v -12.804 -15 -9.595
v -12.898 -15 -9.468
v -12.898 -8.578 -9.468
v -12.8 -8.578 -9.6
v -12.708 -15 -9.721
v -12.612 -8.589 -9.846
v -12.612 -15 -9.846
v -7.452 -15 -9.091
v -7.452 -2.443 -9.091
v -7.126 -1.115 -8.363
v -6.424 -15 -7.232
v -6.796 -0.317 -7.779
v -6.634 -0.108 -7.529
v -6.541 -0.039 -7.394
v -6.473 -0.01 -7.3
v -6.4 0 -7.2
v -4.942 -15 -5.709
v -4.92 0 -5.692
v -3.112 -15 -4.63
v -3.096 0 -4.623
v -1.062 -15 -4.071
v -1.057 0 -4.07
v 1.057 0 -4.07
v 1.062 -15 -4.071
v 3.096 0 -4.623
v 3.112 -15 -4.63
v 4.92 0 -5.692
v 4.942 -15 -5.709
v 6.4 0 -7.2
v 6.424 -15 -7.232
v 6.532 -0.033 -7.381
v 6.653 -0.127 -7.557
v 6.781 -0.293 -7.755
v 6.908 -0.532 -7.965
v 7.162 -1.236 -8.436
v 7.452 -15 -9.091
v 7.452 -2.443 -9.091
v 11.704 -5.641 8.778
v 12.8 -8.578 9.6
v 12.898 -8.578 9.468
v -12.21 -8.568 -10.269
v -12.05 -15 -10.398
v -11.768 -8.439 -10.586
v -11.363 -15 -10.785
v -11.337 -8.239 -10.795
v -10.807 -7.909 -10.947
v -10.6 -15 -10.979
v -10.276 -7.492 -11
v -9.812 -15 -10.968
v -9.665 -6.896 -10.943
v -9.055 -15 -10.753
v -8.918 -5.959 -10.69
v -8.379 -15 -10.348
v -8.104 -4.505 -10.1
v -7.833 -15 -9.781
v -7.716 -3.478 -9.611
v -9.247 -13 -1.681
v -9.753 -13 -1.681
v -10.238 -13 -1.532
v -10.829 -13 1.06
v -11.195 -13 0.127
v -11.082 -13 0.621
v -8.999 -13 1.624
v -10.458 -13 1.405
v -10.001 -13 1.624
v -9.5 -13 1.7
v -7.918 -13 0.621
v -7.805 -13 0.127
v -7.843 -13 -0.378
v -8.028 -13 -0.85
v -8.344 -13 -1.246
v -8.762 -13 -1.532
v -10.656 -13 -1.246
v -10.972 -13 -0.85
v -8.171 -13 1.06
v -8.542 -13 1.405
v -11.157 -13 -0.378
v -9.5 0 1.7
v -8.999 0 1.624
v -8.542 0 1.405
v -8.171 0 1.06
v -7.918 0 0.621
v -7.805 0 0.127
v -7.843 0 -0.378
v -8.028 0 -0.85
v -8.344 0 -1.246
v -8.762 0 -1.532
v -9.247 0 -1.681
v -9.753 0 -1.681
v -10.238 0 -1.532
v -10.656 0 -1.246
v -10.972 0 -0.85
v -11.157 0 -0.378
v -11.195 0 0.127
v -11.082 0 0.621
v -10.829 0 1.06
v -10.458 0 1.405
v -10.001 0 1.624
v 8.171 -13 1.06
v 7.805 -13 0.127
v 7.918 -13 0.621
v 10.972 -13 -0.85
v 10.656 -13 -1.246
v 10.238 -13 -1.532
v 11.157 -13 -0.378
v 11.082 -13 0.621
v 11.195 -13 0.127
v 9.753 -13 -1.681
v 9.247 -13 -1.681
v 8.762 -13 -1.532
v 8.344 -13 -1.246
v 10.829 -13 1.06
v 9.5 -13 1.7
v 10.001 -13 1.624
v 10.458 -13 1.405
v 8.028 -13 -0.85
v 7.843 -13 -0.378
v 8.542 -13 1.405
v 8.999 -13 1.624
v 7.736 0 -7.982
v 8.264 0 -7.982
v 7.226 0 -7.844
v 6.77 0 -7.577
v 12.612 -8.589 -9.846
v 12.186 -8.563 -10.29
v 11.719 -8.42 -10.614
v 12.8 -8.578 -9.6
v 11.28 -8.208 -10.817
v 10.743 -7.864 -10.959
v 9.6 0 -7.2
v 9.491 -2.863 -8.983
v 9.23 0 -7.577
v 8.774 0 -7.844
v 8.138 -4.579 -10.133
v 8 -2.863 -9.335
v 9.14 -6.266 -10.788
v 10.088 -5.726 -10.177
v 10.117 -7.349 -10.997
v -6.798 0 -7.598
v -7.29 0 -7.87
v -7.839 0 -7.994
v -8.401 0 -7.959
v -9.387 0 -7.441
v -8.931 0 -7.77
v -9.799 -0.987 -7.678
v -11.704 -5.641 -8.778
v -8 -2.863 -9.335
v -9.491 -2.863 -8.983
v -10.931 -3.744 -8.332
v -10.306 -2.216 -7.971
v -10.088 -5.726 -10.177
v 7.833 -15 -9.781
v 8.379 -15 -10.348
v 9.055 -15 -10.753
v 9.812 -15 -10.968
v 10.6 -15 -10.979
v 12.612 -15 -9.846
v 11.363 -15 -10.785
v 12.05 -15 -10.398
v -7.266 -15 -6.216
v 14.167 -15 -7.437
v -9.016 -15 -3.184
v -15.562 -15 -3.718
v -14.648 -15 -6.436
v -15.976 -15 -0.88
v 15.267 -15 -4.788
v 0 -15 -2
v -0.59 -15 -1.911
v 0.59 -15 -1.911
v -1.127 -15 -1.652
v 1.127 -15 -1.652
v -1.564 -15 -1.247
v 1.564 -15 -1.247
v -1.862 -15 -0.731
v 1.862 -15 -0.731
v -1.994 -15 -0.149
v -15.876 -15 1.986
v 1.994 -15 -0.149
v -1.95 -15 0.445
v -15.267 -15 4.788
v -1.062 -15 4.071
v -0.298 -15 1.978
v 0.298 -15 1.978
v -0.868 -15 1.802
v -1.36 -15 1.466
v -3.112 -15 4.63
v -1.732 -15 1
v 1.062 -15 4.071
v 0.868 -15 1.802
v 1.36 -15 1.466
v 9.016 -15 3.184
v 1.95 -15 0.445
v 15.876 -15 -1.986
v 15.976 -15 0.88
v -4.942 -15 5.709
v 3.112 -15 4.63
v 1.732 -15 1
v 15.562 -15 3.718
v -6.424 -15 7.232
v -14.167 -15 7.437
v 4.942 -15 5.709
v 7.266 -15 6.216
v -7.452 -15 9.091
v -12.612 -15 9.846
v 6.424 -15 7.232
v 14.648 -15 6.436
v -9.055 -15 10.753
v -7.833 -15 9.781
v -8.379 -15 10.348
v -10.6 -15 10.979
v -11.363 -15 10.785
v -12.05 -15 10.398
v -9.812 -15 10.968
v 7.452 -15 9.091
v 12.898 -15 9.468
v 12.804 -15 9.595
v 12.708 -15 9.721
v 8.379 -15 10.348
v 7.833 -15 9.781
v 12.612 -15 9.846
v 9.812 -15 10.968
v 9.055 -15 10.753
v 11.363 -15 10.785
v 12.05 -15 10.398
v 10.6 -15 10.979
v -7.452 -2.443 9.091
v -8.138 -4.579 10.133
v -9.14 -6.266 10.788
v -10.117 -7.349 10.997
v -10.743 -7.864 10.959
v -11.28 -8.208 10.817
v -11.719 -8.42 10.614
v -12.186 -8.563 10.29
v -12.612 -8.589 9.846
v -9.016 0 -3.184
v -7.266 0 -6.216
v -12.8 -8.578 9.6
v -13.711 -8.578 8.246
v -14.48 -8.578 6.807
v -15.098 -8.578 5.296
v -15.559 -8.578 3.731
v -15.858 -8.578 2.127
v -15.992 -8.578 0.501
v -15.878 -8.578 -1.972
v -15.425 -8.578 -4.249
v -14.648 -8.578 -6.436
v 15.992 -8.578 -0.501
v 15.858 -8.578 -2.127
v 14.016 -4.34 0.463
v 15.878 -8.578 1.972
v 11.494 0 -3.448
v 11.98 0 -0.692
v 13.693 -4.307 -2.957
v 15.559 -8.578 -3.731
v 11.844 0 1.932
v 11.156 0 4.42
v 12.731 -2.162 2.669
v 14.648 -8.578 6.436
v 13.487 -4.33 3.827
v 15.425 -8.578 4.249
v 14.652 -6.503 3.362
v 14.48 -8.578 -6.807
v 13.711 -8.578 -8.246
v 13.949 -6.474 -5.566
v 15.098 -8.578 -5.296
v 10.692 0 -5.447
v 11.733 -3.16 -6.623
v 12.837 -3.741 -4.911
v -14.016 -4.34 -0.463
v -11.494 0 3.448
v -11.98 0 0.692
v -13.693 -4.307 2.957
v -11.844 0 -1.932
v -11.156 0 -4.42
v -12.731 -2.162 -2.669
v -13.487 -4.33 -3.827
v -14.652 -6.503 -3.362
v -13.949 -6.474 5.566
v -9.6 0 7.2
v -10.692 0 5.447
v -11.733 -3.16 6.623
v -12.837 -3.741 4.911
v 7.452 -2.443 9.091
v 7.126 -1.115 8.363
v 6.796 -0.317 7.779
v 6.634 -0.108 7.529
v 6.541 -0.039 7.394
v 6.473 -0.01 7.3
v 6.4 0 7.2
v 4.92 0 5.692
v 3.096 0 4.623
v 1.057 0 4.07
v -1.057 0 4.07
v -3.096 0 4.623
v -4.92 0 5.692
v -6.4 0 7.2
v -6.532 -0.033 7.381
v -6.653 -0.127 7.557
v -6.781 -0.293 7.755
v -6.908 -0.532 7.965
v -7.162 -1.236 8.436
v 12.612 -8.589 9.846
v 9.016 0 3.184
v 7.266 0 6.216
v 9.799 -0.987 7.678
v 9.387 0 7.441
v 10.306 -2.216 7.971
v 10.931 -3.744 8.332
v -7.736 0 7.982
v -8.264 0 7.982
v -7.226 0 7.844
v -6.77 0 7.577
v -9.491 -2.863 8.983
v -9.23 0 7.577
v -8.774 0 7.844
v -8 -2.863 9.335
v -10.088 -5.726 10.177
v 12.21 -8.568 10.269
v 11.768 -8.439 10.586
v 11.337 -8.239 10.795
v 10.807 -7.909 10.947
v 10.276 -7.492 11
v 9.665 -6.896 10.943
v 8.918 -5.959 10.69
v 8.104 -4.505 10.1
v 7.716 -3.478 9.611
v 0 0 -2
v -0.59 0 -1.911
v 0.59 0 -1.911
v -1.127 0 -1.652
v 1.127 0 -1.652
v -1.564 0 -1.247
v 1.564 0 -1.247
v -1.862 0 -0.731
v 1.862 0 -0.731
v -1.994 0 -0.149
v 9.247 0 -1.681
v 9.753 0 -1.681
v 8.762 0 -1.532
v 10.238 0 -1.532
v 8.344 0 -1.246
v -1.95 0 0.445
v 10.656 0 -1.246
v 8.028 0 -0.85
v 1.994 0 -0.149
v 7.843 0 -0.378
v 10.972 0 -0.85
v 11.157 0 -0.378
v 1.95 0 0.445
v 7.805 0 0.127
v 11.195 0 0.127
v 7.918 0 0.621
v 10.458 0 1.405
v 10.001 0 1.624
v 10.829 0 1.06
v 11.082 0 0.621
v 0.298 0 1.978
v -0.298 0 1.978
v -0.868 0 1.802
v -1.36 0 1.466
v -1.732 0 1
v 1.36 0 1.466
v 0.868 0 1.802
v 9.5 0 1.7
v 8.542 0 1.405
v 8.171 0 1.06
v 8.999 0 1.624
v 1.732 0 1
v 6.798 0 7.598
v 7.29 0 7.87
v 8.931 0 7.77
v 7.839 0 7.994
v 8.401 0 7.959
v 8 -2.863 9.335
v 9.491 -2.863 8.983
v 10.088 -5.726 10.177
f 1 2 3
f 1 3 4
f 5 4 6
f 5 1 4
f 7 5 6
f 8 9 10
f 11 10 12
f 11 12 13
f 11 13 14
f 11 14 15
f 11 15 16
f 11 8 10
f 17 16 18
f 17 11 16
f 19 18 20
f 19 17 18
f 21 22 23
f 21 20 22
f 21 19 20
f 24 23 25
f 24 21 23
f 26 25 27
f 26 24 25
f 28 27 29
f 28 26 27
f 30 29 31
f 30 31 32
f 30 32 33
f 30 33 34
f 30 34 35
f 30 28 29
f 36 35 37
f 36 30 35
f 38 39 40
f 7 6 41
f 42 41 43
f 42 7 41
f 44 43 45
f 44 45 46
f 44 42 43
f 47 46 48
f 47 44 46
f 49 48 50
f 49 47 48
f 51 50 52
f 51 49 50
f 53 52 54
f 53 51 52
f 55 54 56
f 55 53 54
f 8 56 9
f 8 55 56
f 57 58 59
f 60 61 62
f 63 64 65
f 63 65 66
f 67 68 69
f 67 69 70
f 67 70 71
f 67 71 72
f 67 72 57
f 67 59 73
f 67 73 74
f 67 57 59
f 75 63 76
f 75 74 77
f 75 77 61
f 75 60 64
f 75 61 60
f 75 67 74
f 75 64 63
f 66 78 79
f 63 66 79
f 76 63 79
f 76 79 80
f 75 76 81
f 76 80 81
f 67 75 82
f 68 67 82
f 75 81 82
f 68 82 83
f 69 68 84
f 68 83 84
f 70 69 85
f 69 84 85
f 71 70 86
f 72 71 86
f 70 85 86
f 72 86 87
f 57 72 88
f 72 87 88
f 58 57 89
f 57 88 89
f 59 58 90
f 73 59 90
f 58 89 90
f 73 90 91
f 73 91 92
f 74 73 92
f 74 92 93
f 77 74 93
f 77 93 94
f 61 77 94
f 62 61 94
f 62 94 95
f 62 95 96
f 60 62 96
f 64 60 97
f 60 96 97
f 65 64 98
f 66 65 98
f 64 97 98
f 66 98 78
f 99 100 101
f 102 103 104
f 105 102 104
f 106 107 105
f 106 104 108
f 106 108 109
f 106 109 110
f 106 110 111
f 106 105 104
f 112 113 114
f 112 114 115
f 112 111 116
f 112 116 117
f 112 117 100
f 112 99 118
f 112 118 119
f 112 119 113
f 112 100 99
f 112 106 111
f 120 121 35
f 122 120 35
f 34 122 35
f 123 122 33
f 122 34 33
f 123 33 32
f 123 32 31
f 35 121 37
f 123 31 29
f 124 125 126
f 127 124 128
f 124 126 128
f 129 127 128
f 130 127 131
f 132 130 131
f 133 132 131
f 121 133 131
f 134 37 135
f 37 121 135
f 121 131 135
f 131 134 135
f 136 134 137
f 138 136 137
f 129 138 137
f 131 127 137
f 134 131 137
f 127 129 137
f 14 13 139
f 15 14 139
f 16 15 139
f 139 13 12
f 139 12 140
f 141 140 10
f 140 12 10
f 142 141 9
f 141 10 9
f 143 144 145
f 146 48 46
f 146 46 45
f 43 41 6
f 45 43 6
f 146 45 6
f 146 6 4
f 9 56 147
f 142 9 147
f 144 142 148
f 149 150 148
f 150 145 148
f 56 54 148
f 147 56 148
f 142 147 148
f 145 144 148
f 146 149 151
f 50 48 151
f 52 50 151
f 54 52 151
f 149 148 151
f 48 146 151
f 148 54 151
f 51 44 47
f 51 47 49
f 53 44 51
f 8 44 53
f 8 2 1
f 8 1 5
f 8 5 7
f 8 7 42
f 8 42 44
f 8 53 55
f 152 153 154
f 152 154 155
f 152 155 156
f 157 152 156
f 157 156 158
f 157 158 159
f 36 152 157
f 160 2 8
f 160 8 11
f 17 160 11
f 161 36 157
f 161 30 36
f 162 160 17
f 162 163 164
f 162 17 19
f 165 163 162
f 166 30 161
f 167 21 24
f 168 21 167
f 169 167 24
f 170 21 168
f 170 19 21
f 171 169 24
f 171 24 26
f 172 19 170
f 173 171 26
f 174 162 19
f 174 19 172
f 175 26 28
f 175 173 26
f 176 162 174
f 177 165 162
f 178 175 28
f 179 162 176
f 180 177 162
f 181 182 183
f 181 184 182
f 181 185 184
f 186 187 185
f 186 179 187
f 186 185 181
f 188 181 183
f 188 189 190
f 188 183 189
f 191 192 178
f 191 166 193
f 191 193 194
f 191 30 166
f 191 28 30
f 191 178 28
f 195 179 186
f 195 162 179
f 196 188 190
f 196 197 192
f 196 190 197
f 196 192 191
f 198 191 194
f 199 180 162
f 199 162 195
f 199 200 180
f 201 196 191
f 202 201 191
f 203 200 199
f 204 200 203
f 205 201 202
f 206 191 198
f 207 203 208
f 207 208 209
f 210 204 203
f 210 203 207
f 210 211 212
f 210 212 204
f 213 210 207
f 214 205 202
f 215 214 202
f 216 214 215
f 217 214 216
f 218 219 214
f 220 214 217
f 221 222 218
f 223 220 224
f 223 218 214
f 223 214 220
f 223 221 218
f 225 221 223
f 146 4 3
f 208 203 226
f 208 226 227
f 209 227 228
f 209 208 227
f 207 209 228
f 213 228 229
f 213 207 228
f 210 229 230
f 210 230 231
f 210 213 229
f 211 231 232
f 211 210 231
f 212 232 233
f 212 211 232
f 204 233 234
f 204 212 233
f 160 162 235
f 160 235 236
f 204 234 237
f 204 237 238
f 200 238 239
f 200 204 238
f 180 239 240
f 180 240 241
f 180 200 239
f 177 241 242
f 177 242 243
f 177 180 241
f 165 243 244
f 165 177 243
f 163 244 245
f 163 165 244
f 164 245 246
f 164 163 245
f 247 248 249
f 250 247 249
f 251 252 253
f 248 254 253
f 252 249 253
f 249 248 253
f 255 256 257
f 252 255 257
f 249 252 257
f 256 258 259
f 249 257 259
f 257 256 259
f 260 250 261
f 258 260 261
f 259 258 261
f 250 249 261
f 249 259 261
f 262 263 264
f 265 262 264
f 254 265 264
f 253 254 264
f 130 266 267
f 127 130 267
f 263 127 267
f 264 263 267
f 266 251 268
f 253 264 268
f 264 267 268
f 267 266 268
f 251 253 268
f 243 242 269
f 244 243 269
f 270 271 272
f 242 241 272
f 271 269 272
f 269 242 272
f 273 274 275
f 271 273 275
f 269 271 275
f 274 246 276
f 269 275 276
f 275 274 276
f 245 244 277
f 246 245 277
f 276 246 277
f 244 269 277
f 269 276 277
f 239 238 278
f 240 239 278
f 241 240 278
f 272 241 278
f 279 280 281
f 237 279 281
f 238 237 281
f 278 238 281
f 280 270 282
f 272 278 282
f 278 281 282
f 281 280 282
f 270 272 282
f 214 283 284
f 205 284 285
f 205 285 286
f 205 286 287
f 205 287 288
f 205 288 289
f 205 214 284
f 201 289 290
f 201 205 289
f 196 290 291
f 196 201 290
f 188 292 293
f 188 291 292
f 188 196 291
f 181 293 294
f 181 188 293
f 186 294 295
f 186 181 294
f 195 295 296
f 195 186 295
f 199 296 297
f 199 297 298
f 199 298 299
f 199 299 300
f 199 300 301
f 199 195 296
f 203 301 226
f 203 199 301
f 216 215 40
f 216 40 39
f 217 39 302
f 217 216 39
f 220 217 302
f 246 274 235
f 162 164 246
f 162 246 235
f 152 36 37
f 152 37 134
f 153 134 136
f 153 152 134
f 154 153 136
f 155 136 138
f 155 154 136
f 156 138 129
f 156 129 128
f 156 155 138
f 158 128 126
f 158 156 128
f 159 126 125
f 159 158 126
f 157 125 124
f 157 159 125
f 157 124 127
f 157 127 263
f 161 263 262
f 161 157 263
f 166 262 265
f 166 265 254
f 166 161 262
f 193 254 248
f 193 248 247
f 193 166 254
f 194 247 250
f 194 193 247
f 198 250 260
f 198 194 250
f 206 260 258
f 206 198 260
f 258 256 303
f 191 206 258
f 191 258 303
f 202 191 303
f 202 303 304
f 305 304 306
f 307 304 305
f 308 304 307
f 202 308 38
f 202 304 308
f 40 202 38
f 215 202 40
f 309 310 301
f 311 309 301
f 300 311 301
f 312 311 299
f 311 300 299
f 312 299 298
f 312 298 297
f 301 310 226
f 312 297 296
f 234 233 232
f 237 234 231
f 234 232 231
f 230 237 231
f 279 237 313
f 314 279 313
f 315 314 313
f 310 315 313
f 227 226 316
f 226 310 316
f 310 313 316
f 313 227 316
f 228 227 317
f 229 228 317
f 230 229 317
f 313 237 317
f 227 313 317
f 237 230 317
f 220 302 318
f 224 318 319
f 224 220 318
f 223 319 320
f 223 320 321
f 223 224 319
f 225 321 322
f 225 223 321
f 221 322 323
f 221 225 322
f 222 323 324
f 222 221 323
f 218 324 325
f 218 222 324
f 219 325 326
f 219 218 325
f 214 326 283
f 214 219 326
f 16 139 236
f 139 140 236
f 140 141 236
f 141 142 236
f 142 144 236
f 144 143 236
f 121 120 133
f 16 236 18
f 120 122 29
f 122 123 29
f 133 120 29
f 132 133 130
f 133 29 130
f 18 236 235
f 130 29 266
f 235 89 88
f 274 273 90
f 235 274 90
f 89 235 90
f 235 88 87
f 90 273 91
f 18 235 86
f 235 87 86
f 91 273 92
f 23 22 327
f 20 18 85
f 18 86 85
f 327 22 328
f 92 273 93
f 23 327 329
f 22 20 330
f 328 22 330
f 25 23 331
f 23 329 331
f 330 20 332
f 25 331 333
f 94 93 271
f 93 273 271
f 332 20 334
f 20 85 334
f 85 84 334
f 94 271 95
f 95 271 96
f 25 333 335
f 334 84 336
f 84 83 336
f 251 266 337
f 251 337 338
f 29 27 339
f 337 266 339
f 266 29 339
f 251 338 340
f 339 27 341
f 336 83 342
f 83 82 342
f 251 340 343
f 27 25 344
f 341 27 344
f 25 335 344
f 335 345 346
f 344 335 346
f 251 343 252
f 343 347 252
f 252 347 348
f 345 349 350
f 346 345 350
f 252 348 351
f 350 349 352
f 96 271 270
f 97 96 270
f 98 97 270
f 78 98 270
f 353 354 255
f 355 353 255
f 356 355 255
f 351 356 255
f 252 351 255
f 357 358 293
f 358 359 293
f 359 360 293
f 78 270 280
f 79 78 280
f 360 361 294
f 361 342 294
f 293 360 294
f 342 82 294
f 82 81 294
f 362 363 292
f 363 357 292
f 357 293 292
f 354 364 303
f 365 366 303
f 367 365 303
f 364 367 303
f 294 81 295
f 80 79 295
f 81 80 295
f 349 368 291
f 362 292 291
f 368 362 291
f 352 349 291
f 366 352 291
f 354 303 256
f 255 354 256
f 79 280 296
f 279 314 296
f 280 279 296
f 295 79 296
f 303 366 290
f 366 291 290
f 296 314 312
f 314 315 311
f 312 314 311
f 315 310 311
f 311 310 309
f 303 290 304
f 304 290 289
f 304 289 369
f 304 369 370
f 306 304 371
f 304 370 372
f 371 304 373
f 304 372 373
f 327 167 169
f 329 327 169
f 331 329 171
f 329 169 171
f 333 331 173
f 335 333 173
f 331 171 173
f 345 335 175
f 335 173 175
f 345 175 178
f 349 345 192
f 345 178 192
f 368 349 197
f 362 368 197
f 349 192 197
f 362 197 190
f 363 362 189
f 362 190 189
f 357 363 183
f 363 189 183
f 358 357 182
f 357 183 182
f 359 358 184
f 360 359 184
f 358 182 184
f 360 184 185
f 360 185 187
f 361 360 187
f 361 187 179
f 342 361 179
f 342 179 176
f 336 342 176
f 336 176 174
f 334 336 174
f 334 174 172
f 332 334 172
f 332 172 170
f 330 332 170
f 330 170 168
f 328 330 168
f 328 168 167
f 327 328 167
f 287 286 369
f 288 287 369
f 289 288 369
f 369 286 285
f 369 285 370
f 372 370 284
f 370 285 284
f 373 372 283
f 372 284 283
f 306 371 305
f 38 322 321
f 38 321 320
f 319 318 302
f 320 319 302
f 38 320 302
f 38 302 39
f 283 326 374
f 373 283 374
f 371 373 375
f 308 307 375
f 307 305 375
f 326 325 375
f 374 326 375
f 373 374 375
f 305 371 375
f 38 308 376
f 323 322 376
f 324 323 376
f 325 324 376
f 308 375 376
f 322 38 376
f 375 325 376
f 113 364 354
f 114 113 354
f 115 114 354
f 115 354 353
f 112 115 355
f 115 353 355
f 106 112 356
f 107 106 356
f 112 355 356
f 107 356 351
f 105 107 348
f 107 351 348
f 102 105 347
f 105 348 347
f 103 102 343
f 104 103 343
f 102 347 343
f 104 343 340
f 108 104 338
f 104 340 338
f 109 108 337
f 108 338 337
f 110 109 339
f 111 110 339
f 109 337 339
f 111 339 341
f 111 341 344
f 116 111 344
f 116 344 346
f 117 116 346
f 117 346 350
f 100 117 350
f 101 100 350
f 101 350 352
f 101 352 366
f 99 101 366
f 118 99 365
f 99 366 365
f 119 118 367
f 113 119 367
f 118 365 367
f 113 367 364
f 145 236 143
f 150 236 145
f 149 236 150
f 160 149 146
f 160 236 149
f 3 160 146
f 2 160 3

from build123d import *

# Parameters (mm, degrees)
BOSS_EXTRUDE1_DEPTH = 15
BOSS_EXTRUDE1_TAPER = -25
SKETCH2_R           = 2
CUT_EXTRUDE1_DEPTH  = 17
SKETCH3_R           = 32.062922841
CUT_EXTRUDE2_DEPTH  = 29.471632885
SKETCH1_3_R         = 1.7
CUT_EXTRUDE3_DEPTH  = 13


with BuildPart() as part:
    # Sketch1 → Boss-Extrude1 (new body)
    with BuildSketch(Plane(origin=(0, 0, 0), x_dir=(1, 0, 0), z_dir=(0, 1, 0))):
        with BuildLine():
            ThreePointArc((6.4, 7.2), (0, 4), (-6.4, 7.2))
            ThreePointArc((-6.4, 7.2), (-8, 8), (-9.6, 7.2))
            add(Edge.make_bspline(
                [(-9.6, 7.2), (-15, 0), (-9.6, -7.2)],
                knots=[2.498091545, 2.498091545, 2.498091545, 3.785093762, 3.785093762, 3.785093762], degree=2, weights=[1, 0.8, 1]))
            ThreePointArc((-9.6, -7.2), (-8, -8), (-6.4, -7.2))
            ThreePointArc((-6.4, -7.2), (0, -4), (6.4, -7.2))
            ThreePointArc((6.4, -7.2), (8, -8), (9.6, -7.2))
            add(Edge.make_bspline(
                [(9.6, -7.2), (15, 0), (9.6, 7.2)],
                knots=[5.639684198, 5.639684198, 5.639684198, 6.926686416, 6.926686416, 6.926686416], degree=2, weights=[1, 0.8, 1]))
            ThreePointArc((9.6, 7.2), (8, 8), (6.4, 7.2))
        make_face()
    extrude(amount=-BOSS_EXTRUDE1_DEPTH, taper=BOSS_EXTRUDE1_TAPER)

    # Sketch2 → Cut-Extrude1 (cut)
    with BuildSketch(Plane.XZ.offset(15)):
        Circle(SKETCH2_R)
    extrude(amount=-CUT_EXTRUDE1_DEPTH, mode=Mode.SUBTRACT)

    # Sketch3 → Cut-Extrude2 (cut, through all)
    with BuildSketch(Plane(origin=(0, 0, 0), x_dir=(1, 0, 0), z_dir=(0, 1, 0))):
        Circle(SKETCH3_R)
        with BuildLine():
            Line((9.015638796, -3.184455543), (7.265638796, -6.215544457))
            Line((7.265638796, -6.215544457), (12.898275754, -9.467548921))
            ThreePointArc((12.898275754, -9.467548921), (12.756358421, -9.657914881), (12.611631712, -9.846153846))
            ThreePointArc((12.611631712, -9.846153846), (9.812426671, -10.96836467), (7.45232783, -9.090909091))
            ThreePointArc((7.45232783, -9.090909091), (0, -4), (-7.45232783, -9.090909091))
            ThreePointArc((-7.45232783, -9.090909091), (-9.812426671, -10.96836467), (-12.611631712, -9.846153846))
            ThreePointArc((-12.611631712, -9.846153846), (-15.876287892, -1.985820424), (-14.648275754, 6.436460008))
            Line((-14.648275754, 6.436460008), (-9.015638796, 3.184455543))
            Line((-9.015638796, 3.184455543), (-7.265638796, 6.215544457))
            Line((-7.265638796, 6.215544457), (-12.898275754, 9.467548921))
            ThreePointArc((-12.898275754, 9.467548921), (-12.756358421, 9.657914881), (-12.611631712, 9.846153846))
            ThreePointArc((-12.611631712, 9.846153846), (-9.812426671, 10.96836467), (-7.45232783, 9.090909091))
            ThreePointArc((-7.45232783, 9.090909091), (0, 4), (7.45232783, 9.090909091))
            ThreePointArc((7.45232783, 9.090909091), (9.812426671, 10.96836467), (12.611631712, 9.846153846))
            ThreePointArc((12.611631712, 9.846153846), (15.876287892, 1.985820424), (14.648275754, -6.436460008))
            Line((14.648275754, -6.436460008), (11.156202507, -4.420310579))
            Line((11.156202507, -4.420310579), (9.015638796, -3.184455543))
        make_face(mode=Mode.SUBTRACT)
    extrude(amount=-CUT_EXTRUDE2_DEPTH, mode=Mode.SUBTRACT)

    # Sketch1<3> → Cut-Extrude3 (cut)
    with BuildSketch(Plane(origin=(0, 0, 0), x_dir=(1, 0, 0), z_dir=(0, 1, 0))):
        with Locations((-9.5, 0)):
            Circle(SKETCH1_3_R)
        with Locations((9.5, 0)):
            Circle(SKETCH1_3_R)
    extrude(amount=-CUT_EXTRUDE3_DEPTH, mode=Mode.SUBTRACT)


solid = part.part
